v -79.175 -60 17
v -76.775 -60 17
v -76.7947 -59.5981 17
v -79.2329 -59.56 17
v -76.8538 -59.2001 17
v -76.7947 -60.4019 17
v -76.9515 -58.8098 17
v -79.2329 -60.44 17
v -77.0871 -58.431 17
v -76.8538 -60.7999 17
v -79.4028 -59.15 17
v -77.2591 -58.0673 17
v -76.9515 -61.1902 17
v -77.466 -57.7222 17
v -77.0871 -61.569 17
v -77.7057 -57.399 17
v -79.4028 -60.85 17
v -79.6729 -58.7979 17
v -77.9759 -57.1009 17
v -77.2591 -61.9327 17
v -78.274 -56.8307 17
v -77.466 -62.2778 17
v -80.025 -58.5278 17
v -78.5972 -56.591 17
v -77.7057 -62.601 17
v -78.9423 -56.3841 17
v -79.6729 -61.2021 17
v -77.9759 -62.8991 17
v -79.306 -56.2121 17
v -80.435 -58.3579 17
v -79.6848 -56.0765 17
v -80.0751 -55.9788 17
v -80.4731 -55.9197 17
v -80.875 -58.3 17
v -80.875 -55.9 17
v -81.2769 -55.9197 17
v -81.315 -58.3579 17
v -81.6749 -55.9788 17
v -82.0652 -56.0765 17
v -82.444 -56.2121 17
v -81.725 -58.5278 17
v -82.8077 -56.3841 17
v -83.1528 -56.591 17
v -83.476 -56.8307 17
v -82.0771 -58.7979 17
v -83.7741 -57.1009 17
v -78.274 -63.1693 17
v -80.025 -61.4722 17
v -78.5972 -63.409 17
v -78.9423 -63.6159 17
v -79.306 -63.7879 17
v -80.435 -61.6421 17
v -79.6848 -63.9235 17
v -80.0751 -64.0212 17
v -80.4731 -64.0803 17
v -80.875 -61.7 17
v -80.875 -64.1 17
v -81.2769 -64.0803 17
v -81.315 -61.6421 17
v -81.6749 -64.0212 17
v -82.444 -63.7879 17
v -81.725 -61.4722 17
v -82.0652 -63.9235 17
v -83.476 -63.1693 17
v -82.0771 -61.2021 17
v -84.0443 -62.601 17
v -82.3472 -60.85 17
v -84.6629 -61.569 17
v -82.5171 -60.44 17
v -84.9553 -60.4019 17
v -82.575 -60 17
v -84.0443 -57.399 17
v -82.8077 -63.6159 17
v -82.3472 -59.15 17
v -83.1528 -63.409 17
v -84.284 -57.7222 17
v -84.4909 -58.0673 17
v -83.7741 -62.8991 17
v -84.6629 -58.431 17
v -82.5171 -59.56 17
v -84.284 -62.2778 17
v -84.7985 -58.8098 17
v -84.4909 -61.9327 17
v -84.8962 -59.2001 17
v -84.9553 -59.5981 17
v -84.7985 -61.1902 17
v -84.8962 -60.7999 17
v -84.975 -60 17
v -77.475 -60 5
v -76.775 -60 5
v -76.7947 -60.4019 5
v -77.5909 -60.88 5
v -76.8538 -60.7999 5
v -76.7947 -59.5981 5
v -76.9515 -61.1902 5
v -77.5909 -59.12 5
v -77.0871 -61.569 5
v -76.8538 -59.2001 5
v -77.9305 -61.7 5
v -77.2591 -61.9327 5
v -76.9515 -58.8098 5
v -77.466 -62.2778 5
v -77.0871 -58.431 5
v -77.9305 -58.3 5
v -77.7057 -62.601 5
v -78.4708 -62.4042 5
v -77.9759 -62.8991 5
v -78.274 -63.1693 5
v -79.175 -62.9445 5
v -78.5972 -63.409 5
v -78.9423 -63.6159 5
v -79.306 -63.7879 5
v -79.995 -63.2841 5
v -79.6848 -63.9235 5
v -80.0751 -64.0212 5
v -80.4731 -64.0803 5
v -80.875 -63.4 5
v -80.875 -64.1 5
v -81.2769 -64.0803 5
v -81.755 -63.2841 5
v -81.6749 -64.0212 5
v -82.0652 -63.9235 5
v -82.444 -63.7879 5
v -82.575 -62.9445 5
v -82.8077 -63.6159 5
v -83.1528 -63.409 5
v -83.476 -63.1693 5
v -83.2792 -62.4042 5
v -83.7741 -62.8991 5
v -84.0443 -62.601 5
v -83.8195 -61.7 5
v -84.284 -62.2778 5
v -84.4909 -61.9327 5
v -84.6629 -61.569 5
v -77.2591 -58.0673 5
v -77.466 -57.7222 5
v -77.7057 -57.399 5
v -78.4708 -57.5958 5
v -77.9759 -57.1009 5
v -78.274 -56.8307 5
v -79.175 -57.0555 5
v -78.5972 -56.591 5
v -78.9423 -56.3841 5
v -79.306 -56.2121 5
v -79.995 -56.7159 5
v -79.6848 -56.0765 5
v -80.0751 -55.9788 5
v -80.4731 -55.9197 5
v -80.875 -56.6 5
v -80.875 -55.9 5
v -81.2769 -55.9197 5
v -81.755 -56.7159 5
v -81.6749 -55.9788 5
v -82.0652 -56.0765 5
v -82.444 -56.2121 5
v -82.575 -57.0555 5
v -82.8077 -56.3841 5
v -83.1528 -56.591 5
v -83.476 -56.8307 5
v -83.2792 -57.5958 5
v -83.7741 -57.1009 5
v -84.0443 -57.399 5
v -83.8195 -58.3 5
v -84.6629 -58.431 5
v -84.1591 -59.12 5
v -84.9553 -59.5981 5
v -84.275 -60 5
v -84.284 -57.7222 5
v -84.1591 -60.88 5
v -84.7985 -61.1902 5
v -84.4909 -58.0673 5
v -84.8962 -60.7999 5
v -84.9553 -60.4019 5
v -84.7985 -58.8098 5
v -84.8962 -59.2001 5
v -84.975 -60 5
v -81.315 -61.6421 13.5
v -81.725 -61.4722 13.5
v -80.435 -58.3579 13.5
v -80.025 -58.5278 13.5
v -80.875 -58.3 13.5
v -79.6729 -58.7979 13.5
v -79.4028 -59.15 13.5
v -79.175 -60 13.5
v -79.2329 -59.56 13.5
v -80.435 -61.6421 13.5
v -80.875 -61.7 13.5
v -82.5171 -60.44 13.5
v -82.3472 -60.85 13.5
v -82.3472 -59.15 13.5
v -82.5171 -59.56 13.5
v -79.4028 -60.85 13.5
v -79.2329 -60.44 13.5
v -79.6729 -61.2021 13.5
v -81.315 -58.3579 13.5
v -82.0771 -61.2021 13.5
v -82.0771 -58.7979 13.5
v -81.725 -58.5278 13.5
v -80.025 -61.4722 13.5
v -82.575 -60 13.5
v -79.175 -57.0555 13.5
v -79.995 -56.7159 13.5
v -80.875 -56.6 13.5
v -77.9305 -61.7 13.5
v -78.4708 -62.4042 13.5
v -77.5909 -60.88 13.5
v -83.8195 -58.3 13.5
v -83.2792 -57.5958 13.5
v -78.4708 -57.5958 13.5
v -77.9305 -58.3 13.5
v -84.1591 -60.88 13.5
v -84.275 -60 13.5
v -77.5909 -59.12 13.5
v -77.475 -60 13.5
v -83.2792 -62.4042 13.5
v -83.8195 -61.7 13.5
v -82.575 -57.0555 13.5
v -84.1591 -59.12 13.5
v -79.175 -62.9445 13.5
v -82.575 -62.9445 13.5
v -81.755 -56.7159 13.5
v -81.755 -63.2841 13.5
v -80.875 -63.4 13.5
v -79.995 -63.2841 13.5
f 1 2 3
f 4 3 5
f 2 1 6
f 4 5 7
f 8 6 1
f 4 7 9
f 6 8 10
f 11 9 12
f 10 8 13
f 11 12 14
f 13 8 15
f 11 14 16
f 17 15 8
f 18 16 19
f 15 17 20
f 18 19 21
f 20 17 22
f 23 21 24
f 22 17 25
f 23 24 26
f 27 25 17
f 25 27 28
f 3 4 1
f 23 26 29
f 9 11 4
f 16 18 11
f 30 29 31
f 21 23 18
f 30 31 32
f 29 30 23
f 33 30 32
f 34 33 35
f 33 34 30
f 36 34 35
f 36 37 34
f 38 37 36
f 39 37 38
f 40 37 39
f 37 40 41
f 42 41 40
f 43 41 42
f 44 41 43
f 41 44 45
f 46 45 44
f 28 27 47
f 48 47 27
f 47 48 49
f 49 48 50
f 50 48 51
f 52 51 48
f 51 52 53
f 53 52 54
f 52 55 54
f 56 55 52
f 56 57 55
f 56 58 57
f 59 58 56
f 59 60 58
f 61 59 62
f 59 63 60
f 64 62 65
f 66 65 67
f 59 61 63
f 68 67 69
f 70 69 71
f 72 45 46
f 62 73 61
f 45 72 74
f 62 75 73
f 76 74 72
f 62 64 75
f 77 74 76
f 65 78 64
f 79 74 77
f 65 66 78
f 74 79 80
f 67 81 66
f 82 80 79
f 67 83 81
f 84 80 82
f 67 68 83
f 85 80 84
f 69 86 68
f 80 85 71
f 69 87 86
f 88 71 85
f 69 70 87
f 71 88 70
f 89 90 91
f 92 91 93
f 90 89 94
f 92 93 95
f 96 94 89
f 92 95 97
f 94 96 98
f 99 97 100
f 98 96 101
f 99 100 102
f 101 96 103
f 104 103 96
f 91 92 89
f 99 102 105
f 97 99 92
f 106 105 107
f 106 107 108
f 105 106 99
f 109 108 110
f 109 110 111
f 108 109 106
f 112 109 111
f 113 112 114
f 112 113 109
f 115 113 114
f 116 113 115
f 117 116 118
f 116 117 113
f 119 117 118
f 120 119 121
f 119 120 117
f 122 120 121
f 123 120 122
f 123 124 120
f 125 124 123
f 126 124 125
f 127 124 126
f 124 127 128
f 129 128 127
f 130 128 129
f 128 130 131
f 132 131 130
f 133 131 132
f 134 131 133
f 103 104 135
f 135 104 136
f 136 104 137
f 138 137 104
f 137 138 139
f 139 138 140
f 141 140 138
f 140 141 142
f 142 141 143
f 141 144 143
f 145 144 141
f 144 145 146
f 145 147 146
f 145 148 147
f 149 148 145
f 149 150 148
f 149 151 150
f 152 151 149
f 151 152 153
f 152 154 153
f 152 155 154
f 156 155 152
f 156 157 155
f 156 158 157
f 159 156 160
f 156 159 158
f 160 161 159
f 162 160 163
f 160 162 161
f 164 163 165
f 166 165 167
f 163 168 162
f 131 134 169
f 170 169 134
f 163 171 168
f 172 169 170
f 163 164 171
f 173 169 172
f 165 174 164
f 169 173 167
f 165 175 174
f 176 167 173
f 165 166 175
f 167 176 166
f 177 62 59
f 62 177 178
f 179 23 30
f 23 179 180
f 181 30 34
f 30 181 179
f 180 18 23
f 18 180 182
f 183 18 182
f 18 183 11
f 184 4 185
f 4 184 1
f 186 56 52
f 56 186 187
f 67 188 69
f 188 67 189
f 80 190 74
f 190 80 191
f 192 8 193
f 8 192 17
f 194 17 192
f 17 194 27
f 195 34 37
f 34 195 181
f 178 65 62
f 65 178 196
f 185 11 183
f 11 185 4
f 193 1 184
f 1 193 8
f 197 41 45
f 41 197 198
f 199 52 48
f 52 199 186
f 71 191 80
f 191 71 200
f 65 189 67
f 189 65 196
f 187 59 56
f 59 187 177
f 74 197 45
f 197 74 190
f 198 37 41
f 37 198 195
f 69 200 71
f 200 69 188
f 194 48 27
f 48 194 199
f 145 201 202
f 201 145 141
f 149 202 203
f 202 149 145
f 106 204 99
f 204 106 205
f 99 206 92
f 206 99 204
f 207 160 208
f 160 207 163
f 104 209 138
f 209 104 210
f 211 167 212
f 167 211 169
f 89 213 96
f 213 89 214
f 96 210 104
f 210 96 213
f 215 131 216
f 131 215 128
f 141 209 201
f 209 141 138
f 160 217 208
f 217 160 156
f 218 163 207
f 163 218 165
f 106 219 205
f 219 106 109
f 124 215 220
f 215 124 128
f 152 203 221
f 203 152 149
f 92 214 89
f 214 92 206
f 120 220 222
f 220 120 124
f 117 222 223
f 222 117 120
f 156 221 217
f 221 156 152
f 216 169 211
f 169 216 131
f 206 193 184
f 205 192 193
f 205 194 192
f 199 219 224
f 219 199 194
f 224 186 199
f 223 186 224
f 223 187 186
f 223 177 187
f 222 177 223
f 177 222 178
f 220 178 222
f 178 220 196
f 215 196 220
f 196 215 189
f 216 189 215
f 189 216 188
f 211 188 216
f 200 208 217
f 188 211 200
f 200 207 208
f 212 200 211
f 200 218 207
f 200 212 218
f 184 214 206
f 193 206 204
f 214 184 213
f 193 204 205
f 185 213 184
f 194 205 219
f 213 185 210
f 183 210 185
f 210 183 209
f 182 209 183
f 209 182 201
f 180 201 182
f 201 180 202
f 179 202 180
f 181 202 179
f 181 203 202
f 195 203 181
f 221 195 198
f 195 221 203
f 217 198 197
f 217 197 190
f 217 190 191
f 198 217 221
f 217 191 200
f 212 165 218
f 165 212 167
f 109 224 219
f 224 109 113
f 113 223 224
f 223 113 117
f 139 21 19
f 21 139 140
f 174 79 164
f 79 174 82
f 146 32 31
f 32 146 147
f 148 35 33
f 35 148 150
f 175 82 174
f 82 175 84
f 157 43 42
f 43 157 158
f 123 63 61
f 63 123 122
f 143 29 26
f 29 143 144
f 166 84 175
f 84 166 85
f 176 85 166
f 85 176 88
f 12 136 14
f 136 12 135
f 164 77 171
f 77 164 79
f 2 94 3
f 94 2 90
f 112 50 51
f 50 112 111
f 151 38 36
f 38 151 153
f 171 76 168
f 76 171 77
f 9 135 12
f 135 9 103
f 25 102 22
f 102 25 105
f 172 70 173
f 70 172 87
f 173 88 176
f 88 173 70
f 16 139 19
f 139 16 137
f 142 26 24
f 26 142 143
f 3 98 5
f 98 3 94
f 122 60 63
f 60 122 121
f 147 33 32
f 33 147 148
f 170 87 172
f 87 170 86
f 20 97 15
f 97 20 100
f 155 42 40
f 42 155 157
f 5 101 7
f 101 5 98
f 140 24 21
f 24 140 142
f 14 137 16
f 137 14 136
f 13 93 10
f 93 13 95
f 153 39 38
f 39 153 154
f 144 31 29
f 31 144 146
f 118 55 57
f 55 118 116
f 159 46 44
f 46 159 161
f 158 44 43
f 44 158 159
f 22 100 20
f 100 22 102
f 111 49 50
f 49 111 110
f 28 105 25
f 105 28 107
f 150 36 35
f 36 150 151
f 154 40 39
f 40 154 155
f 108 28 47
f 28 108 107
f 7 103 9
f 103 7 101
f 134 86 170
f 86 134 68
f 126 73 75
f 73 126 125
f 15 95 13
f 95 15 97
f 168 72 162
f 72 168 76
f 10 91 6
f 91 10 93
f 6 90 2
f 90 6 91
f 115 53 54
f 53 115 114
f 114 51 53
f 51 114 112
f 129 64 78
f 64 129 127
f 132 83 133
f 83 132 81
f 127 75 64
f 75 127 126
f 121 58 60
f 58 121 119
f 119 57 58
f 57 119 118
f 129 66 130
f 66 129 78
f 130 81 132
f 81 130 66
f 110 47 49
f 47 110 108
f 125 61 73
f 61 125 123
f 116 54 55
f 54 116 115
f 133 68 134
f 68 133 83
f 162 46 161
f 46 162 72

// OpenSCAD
// The Y servo holder's side-wall floor screw must go through X carriage
// material: a screw-head-sized disc under it, inside the carriage, has to
// hit the carriage. Must render non-empty.
include <../axes.scad>
p = holder_floor_pts[2];
intersection() {
    x_carriage();
    at_inverted_servo(y_shaft_x_rel, y_shaft_y, y_pinion_z0, 90)
        translate([p[0], p[1], holder_floor_up]) cylinder(d = m3_head_d + 2, h = xc_h);
}
